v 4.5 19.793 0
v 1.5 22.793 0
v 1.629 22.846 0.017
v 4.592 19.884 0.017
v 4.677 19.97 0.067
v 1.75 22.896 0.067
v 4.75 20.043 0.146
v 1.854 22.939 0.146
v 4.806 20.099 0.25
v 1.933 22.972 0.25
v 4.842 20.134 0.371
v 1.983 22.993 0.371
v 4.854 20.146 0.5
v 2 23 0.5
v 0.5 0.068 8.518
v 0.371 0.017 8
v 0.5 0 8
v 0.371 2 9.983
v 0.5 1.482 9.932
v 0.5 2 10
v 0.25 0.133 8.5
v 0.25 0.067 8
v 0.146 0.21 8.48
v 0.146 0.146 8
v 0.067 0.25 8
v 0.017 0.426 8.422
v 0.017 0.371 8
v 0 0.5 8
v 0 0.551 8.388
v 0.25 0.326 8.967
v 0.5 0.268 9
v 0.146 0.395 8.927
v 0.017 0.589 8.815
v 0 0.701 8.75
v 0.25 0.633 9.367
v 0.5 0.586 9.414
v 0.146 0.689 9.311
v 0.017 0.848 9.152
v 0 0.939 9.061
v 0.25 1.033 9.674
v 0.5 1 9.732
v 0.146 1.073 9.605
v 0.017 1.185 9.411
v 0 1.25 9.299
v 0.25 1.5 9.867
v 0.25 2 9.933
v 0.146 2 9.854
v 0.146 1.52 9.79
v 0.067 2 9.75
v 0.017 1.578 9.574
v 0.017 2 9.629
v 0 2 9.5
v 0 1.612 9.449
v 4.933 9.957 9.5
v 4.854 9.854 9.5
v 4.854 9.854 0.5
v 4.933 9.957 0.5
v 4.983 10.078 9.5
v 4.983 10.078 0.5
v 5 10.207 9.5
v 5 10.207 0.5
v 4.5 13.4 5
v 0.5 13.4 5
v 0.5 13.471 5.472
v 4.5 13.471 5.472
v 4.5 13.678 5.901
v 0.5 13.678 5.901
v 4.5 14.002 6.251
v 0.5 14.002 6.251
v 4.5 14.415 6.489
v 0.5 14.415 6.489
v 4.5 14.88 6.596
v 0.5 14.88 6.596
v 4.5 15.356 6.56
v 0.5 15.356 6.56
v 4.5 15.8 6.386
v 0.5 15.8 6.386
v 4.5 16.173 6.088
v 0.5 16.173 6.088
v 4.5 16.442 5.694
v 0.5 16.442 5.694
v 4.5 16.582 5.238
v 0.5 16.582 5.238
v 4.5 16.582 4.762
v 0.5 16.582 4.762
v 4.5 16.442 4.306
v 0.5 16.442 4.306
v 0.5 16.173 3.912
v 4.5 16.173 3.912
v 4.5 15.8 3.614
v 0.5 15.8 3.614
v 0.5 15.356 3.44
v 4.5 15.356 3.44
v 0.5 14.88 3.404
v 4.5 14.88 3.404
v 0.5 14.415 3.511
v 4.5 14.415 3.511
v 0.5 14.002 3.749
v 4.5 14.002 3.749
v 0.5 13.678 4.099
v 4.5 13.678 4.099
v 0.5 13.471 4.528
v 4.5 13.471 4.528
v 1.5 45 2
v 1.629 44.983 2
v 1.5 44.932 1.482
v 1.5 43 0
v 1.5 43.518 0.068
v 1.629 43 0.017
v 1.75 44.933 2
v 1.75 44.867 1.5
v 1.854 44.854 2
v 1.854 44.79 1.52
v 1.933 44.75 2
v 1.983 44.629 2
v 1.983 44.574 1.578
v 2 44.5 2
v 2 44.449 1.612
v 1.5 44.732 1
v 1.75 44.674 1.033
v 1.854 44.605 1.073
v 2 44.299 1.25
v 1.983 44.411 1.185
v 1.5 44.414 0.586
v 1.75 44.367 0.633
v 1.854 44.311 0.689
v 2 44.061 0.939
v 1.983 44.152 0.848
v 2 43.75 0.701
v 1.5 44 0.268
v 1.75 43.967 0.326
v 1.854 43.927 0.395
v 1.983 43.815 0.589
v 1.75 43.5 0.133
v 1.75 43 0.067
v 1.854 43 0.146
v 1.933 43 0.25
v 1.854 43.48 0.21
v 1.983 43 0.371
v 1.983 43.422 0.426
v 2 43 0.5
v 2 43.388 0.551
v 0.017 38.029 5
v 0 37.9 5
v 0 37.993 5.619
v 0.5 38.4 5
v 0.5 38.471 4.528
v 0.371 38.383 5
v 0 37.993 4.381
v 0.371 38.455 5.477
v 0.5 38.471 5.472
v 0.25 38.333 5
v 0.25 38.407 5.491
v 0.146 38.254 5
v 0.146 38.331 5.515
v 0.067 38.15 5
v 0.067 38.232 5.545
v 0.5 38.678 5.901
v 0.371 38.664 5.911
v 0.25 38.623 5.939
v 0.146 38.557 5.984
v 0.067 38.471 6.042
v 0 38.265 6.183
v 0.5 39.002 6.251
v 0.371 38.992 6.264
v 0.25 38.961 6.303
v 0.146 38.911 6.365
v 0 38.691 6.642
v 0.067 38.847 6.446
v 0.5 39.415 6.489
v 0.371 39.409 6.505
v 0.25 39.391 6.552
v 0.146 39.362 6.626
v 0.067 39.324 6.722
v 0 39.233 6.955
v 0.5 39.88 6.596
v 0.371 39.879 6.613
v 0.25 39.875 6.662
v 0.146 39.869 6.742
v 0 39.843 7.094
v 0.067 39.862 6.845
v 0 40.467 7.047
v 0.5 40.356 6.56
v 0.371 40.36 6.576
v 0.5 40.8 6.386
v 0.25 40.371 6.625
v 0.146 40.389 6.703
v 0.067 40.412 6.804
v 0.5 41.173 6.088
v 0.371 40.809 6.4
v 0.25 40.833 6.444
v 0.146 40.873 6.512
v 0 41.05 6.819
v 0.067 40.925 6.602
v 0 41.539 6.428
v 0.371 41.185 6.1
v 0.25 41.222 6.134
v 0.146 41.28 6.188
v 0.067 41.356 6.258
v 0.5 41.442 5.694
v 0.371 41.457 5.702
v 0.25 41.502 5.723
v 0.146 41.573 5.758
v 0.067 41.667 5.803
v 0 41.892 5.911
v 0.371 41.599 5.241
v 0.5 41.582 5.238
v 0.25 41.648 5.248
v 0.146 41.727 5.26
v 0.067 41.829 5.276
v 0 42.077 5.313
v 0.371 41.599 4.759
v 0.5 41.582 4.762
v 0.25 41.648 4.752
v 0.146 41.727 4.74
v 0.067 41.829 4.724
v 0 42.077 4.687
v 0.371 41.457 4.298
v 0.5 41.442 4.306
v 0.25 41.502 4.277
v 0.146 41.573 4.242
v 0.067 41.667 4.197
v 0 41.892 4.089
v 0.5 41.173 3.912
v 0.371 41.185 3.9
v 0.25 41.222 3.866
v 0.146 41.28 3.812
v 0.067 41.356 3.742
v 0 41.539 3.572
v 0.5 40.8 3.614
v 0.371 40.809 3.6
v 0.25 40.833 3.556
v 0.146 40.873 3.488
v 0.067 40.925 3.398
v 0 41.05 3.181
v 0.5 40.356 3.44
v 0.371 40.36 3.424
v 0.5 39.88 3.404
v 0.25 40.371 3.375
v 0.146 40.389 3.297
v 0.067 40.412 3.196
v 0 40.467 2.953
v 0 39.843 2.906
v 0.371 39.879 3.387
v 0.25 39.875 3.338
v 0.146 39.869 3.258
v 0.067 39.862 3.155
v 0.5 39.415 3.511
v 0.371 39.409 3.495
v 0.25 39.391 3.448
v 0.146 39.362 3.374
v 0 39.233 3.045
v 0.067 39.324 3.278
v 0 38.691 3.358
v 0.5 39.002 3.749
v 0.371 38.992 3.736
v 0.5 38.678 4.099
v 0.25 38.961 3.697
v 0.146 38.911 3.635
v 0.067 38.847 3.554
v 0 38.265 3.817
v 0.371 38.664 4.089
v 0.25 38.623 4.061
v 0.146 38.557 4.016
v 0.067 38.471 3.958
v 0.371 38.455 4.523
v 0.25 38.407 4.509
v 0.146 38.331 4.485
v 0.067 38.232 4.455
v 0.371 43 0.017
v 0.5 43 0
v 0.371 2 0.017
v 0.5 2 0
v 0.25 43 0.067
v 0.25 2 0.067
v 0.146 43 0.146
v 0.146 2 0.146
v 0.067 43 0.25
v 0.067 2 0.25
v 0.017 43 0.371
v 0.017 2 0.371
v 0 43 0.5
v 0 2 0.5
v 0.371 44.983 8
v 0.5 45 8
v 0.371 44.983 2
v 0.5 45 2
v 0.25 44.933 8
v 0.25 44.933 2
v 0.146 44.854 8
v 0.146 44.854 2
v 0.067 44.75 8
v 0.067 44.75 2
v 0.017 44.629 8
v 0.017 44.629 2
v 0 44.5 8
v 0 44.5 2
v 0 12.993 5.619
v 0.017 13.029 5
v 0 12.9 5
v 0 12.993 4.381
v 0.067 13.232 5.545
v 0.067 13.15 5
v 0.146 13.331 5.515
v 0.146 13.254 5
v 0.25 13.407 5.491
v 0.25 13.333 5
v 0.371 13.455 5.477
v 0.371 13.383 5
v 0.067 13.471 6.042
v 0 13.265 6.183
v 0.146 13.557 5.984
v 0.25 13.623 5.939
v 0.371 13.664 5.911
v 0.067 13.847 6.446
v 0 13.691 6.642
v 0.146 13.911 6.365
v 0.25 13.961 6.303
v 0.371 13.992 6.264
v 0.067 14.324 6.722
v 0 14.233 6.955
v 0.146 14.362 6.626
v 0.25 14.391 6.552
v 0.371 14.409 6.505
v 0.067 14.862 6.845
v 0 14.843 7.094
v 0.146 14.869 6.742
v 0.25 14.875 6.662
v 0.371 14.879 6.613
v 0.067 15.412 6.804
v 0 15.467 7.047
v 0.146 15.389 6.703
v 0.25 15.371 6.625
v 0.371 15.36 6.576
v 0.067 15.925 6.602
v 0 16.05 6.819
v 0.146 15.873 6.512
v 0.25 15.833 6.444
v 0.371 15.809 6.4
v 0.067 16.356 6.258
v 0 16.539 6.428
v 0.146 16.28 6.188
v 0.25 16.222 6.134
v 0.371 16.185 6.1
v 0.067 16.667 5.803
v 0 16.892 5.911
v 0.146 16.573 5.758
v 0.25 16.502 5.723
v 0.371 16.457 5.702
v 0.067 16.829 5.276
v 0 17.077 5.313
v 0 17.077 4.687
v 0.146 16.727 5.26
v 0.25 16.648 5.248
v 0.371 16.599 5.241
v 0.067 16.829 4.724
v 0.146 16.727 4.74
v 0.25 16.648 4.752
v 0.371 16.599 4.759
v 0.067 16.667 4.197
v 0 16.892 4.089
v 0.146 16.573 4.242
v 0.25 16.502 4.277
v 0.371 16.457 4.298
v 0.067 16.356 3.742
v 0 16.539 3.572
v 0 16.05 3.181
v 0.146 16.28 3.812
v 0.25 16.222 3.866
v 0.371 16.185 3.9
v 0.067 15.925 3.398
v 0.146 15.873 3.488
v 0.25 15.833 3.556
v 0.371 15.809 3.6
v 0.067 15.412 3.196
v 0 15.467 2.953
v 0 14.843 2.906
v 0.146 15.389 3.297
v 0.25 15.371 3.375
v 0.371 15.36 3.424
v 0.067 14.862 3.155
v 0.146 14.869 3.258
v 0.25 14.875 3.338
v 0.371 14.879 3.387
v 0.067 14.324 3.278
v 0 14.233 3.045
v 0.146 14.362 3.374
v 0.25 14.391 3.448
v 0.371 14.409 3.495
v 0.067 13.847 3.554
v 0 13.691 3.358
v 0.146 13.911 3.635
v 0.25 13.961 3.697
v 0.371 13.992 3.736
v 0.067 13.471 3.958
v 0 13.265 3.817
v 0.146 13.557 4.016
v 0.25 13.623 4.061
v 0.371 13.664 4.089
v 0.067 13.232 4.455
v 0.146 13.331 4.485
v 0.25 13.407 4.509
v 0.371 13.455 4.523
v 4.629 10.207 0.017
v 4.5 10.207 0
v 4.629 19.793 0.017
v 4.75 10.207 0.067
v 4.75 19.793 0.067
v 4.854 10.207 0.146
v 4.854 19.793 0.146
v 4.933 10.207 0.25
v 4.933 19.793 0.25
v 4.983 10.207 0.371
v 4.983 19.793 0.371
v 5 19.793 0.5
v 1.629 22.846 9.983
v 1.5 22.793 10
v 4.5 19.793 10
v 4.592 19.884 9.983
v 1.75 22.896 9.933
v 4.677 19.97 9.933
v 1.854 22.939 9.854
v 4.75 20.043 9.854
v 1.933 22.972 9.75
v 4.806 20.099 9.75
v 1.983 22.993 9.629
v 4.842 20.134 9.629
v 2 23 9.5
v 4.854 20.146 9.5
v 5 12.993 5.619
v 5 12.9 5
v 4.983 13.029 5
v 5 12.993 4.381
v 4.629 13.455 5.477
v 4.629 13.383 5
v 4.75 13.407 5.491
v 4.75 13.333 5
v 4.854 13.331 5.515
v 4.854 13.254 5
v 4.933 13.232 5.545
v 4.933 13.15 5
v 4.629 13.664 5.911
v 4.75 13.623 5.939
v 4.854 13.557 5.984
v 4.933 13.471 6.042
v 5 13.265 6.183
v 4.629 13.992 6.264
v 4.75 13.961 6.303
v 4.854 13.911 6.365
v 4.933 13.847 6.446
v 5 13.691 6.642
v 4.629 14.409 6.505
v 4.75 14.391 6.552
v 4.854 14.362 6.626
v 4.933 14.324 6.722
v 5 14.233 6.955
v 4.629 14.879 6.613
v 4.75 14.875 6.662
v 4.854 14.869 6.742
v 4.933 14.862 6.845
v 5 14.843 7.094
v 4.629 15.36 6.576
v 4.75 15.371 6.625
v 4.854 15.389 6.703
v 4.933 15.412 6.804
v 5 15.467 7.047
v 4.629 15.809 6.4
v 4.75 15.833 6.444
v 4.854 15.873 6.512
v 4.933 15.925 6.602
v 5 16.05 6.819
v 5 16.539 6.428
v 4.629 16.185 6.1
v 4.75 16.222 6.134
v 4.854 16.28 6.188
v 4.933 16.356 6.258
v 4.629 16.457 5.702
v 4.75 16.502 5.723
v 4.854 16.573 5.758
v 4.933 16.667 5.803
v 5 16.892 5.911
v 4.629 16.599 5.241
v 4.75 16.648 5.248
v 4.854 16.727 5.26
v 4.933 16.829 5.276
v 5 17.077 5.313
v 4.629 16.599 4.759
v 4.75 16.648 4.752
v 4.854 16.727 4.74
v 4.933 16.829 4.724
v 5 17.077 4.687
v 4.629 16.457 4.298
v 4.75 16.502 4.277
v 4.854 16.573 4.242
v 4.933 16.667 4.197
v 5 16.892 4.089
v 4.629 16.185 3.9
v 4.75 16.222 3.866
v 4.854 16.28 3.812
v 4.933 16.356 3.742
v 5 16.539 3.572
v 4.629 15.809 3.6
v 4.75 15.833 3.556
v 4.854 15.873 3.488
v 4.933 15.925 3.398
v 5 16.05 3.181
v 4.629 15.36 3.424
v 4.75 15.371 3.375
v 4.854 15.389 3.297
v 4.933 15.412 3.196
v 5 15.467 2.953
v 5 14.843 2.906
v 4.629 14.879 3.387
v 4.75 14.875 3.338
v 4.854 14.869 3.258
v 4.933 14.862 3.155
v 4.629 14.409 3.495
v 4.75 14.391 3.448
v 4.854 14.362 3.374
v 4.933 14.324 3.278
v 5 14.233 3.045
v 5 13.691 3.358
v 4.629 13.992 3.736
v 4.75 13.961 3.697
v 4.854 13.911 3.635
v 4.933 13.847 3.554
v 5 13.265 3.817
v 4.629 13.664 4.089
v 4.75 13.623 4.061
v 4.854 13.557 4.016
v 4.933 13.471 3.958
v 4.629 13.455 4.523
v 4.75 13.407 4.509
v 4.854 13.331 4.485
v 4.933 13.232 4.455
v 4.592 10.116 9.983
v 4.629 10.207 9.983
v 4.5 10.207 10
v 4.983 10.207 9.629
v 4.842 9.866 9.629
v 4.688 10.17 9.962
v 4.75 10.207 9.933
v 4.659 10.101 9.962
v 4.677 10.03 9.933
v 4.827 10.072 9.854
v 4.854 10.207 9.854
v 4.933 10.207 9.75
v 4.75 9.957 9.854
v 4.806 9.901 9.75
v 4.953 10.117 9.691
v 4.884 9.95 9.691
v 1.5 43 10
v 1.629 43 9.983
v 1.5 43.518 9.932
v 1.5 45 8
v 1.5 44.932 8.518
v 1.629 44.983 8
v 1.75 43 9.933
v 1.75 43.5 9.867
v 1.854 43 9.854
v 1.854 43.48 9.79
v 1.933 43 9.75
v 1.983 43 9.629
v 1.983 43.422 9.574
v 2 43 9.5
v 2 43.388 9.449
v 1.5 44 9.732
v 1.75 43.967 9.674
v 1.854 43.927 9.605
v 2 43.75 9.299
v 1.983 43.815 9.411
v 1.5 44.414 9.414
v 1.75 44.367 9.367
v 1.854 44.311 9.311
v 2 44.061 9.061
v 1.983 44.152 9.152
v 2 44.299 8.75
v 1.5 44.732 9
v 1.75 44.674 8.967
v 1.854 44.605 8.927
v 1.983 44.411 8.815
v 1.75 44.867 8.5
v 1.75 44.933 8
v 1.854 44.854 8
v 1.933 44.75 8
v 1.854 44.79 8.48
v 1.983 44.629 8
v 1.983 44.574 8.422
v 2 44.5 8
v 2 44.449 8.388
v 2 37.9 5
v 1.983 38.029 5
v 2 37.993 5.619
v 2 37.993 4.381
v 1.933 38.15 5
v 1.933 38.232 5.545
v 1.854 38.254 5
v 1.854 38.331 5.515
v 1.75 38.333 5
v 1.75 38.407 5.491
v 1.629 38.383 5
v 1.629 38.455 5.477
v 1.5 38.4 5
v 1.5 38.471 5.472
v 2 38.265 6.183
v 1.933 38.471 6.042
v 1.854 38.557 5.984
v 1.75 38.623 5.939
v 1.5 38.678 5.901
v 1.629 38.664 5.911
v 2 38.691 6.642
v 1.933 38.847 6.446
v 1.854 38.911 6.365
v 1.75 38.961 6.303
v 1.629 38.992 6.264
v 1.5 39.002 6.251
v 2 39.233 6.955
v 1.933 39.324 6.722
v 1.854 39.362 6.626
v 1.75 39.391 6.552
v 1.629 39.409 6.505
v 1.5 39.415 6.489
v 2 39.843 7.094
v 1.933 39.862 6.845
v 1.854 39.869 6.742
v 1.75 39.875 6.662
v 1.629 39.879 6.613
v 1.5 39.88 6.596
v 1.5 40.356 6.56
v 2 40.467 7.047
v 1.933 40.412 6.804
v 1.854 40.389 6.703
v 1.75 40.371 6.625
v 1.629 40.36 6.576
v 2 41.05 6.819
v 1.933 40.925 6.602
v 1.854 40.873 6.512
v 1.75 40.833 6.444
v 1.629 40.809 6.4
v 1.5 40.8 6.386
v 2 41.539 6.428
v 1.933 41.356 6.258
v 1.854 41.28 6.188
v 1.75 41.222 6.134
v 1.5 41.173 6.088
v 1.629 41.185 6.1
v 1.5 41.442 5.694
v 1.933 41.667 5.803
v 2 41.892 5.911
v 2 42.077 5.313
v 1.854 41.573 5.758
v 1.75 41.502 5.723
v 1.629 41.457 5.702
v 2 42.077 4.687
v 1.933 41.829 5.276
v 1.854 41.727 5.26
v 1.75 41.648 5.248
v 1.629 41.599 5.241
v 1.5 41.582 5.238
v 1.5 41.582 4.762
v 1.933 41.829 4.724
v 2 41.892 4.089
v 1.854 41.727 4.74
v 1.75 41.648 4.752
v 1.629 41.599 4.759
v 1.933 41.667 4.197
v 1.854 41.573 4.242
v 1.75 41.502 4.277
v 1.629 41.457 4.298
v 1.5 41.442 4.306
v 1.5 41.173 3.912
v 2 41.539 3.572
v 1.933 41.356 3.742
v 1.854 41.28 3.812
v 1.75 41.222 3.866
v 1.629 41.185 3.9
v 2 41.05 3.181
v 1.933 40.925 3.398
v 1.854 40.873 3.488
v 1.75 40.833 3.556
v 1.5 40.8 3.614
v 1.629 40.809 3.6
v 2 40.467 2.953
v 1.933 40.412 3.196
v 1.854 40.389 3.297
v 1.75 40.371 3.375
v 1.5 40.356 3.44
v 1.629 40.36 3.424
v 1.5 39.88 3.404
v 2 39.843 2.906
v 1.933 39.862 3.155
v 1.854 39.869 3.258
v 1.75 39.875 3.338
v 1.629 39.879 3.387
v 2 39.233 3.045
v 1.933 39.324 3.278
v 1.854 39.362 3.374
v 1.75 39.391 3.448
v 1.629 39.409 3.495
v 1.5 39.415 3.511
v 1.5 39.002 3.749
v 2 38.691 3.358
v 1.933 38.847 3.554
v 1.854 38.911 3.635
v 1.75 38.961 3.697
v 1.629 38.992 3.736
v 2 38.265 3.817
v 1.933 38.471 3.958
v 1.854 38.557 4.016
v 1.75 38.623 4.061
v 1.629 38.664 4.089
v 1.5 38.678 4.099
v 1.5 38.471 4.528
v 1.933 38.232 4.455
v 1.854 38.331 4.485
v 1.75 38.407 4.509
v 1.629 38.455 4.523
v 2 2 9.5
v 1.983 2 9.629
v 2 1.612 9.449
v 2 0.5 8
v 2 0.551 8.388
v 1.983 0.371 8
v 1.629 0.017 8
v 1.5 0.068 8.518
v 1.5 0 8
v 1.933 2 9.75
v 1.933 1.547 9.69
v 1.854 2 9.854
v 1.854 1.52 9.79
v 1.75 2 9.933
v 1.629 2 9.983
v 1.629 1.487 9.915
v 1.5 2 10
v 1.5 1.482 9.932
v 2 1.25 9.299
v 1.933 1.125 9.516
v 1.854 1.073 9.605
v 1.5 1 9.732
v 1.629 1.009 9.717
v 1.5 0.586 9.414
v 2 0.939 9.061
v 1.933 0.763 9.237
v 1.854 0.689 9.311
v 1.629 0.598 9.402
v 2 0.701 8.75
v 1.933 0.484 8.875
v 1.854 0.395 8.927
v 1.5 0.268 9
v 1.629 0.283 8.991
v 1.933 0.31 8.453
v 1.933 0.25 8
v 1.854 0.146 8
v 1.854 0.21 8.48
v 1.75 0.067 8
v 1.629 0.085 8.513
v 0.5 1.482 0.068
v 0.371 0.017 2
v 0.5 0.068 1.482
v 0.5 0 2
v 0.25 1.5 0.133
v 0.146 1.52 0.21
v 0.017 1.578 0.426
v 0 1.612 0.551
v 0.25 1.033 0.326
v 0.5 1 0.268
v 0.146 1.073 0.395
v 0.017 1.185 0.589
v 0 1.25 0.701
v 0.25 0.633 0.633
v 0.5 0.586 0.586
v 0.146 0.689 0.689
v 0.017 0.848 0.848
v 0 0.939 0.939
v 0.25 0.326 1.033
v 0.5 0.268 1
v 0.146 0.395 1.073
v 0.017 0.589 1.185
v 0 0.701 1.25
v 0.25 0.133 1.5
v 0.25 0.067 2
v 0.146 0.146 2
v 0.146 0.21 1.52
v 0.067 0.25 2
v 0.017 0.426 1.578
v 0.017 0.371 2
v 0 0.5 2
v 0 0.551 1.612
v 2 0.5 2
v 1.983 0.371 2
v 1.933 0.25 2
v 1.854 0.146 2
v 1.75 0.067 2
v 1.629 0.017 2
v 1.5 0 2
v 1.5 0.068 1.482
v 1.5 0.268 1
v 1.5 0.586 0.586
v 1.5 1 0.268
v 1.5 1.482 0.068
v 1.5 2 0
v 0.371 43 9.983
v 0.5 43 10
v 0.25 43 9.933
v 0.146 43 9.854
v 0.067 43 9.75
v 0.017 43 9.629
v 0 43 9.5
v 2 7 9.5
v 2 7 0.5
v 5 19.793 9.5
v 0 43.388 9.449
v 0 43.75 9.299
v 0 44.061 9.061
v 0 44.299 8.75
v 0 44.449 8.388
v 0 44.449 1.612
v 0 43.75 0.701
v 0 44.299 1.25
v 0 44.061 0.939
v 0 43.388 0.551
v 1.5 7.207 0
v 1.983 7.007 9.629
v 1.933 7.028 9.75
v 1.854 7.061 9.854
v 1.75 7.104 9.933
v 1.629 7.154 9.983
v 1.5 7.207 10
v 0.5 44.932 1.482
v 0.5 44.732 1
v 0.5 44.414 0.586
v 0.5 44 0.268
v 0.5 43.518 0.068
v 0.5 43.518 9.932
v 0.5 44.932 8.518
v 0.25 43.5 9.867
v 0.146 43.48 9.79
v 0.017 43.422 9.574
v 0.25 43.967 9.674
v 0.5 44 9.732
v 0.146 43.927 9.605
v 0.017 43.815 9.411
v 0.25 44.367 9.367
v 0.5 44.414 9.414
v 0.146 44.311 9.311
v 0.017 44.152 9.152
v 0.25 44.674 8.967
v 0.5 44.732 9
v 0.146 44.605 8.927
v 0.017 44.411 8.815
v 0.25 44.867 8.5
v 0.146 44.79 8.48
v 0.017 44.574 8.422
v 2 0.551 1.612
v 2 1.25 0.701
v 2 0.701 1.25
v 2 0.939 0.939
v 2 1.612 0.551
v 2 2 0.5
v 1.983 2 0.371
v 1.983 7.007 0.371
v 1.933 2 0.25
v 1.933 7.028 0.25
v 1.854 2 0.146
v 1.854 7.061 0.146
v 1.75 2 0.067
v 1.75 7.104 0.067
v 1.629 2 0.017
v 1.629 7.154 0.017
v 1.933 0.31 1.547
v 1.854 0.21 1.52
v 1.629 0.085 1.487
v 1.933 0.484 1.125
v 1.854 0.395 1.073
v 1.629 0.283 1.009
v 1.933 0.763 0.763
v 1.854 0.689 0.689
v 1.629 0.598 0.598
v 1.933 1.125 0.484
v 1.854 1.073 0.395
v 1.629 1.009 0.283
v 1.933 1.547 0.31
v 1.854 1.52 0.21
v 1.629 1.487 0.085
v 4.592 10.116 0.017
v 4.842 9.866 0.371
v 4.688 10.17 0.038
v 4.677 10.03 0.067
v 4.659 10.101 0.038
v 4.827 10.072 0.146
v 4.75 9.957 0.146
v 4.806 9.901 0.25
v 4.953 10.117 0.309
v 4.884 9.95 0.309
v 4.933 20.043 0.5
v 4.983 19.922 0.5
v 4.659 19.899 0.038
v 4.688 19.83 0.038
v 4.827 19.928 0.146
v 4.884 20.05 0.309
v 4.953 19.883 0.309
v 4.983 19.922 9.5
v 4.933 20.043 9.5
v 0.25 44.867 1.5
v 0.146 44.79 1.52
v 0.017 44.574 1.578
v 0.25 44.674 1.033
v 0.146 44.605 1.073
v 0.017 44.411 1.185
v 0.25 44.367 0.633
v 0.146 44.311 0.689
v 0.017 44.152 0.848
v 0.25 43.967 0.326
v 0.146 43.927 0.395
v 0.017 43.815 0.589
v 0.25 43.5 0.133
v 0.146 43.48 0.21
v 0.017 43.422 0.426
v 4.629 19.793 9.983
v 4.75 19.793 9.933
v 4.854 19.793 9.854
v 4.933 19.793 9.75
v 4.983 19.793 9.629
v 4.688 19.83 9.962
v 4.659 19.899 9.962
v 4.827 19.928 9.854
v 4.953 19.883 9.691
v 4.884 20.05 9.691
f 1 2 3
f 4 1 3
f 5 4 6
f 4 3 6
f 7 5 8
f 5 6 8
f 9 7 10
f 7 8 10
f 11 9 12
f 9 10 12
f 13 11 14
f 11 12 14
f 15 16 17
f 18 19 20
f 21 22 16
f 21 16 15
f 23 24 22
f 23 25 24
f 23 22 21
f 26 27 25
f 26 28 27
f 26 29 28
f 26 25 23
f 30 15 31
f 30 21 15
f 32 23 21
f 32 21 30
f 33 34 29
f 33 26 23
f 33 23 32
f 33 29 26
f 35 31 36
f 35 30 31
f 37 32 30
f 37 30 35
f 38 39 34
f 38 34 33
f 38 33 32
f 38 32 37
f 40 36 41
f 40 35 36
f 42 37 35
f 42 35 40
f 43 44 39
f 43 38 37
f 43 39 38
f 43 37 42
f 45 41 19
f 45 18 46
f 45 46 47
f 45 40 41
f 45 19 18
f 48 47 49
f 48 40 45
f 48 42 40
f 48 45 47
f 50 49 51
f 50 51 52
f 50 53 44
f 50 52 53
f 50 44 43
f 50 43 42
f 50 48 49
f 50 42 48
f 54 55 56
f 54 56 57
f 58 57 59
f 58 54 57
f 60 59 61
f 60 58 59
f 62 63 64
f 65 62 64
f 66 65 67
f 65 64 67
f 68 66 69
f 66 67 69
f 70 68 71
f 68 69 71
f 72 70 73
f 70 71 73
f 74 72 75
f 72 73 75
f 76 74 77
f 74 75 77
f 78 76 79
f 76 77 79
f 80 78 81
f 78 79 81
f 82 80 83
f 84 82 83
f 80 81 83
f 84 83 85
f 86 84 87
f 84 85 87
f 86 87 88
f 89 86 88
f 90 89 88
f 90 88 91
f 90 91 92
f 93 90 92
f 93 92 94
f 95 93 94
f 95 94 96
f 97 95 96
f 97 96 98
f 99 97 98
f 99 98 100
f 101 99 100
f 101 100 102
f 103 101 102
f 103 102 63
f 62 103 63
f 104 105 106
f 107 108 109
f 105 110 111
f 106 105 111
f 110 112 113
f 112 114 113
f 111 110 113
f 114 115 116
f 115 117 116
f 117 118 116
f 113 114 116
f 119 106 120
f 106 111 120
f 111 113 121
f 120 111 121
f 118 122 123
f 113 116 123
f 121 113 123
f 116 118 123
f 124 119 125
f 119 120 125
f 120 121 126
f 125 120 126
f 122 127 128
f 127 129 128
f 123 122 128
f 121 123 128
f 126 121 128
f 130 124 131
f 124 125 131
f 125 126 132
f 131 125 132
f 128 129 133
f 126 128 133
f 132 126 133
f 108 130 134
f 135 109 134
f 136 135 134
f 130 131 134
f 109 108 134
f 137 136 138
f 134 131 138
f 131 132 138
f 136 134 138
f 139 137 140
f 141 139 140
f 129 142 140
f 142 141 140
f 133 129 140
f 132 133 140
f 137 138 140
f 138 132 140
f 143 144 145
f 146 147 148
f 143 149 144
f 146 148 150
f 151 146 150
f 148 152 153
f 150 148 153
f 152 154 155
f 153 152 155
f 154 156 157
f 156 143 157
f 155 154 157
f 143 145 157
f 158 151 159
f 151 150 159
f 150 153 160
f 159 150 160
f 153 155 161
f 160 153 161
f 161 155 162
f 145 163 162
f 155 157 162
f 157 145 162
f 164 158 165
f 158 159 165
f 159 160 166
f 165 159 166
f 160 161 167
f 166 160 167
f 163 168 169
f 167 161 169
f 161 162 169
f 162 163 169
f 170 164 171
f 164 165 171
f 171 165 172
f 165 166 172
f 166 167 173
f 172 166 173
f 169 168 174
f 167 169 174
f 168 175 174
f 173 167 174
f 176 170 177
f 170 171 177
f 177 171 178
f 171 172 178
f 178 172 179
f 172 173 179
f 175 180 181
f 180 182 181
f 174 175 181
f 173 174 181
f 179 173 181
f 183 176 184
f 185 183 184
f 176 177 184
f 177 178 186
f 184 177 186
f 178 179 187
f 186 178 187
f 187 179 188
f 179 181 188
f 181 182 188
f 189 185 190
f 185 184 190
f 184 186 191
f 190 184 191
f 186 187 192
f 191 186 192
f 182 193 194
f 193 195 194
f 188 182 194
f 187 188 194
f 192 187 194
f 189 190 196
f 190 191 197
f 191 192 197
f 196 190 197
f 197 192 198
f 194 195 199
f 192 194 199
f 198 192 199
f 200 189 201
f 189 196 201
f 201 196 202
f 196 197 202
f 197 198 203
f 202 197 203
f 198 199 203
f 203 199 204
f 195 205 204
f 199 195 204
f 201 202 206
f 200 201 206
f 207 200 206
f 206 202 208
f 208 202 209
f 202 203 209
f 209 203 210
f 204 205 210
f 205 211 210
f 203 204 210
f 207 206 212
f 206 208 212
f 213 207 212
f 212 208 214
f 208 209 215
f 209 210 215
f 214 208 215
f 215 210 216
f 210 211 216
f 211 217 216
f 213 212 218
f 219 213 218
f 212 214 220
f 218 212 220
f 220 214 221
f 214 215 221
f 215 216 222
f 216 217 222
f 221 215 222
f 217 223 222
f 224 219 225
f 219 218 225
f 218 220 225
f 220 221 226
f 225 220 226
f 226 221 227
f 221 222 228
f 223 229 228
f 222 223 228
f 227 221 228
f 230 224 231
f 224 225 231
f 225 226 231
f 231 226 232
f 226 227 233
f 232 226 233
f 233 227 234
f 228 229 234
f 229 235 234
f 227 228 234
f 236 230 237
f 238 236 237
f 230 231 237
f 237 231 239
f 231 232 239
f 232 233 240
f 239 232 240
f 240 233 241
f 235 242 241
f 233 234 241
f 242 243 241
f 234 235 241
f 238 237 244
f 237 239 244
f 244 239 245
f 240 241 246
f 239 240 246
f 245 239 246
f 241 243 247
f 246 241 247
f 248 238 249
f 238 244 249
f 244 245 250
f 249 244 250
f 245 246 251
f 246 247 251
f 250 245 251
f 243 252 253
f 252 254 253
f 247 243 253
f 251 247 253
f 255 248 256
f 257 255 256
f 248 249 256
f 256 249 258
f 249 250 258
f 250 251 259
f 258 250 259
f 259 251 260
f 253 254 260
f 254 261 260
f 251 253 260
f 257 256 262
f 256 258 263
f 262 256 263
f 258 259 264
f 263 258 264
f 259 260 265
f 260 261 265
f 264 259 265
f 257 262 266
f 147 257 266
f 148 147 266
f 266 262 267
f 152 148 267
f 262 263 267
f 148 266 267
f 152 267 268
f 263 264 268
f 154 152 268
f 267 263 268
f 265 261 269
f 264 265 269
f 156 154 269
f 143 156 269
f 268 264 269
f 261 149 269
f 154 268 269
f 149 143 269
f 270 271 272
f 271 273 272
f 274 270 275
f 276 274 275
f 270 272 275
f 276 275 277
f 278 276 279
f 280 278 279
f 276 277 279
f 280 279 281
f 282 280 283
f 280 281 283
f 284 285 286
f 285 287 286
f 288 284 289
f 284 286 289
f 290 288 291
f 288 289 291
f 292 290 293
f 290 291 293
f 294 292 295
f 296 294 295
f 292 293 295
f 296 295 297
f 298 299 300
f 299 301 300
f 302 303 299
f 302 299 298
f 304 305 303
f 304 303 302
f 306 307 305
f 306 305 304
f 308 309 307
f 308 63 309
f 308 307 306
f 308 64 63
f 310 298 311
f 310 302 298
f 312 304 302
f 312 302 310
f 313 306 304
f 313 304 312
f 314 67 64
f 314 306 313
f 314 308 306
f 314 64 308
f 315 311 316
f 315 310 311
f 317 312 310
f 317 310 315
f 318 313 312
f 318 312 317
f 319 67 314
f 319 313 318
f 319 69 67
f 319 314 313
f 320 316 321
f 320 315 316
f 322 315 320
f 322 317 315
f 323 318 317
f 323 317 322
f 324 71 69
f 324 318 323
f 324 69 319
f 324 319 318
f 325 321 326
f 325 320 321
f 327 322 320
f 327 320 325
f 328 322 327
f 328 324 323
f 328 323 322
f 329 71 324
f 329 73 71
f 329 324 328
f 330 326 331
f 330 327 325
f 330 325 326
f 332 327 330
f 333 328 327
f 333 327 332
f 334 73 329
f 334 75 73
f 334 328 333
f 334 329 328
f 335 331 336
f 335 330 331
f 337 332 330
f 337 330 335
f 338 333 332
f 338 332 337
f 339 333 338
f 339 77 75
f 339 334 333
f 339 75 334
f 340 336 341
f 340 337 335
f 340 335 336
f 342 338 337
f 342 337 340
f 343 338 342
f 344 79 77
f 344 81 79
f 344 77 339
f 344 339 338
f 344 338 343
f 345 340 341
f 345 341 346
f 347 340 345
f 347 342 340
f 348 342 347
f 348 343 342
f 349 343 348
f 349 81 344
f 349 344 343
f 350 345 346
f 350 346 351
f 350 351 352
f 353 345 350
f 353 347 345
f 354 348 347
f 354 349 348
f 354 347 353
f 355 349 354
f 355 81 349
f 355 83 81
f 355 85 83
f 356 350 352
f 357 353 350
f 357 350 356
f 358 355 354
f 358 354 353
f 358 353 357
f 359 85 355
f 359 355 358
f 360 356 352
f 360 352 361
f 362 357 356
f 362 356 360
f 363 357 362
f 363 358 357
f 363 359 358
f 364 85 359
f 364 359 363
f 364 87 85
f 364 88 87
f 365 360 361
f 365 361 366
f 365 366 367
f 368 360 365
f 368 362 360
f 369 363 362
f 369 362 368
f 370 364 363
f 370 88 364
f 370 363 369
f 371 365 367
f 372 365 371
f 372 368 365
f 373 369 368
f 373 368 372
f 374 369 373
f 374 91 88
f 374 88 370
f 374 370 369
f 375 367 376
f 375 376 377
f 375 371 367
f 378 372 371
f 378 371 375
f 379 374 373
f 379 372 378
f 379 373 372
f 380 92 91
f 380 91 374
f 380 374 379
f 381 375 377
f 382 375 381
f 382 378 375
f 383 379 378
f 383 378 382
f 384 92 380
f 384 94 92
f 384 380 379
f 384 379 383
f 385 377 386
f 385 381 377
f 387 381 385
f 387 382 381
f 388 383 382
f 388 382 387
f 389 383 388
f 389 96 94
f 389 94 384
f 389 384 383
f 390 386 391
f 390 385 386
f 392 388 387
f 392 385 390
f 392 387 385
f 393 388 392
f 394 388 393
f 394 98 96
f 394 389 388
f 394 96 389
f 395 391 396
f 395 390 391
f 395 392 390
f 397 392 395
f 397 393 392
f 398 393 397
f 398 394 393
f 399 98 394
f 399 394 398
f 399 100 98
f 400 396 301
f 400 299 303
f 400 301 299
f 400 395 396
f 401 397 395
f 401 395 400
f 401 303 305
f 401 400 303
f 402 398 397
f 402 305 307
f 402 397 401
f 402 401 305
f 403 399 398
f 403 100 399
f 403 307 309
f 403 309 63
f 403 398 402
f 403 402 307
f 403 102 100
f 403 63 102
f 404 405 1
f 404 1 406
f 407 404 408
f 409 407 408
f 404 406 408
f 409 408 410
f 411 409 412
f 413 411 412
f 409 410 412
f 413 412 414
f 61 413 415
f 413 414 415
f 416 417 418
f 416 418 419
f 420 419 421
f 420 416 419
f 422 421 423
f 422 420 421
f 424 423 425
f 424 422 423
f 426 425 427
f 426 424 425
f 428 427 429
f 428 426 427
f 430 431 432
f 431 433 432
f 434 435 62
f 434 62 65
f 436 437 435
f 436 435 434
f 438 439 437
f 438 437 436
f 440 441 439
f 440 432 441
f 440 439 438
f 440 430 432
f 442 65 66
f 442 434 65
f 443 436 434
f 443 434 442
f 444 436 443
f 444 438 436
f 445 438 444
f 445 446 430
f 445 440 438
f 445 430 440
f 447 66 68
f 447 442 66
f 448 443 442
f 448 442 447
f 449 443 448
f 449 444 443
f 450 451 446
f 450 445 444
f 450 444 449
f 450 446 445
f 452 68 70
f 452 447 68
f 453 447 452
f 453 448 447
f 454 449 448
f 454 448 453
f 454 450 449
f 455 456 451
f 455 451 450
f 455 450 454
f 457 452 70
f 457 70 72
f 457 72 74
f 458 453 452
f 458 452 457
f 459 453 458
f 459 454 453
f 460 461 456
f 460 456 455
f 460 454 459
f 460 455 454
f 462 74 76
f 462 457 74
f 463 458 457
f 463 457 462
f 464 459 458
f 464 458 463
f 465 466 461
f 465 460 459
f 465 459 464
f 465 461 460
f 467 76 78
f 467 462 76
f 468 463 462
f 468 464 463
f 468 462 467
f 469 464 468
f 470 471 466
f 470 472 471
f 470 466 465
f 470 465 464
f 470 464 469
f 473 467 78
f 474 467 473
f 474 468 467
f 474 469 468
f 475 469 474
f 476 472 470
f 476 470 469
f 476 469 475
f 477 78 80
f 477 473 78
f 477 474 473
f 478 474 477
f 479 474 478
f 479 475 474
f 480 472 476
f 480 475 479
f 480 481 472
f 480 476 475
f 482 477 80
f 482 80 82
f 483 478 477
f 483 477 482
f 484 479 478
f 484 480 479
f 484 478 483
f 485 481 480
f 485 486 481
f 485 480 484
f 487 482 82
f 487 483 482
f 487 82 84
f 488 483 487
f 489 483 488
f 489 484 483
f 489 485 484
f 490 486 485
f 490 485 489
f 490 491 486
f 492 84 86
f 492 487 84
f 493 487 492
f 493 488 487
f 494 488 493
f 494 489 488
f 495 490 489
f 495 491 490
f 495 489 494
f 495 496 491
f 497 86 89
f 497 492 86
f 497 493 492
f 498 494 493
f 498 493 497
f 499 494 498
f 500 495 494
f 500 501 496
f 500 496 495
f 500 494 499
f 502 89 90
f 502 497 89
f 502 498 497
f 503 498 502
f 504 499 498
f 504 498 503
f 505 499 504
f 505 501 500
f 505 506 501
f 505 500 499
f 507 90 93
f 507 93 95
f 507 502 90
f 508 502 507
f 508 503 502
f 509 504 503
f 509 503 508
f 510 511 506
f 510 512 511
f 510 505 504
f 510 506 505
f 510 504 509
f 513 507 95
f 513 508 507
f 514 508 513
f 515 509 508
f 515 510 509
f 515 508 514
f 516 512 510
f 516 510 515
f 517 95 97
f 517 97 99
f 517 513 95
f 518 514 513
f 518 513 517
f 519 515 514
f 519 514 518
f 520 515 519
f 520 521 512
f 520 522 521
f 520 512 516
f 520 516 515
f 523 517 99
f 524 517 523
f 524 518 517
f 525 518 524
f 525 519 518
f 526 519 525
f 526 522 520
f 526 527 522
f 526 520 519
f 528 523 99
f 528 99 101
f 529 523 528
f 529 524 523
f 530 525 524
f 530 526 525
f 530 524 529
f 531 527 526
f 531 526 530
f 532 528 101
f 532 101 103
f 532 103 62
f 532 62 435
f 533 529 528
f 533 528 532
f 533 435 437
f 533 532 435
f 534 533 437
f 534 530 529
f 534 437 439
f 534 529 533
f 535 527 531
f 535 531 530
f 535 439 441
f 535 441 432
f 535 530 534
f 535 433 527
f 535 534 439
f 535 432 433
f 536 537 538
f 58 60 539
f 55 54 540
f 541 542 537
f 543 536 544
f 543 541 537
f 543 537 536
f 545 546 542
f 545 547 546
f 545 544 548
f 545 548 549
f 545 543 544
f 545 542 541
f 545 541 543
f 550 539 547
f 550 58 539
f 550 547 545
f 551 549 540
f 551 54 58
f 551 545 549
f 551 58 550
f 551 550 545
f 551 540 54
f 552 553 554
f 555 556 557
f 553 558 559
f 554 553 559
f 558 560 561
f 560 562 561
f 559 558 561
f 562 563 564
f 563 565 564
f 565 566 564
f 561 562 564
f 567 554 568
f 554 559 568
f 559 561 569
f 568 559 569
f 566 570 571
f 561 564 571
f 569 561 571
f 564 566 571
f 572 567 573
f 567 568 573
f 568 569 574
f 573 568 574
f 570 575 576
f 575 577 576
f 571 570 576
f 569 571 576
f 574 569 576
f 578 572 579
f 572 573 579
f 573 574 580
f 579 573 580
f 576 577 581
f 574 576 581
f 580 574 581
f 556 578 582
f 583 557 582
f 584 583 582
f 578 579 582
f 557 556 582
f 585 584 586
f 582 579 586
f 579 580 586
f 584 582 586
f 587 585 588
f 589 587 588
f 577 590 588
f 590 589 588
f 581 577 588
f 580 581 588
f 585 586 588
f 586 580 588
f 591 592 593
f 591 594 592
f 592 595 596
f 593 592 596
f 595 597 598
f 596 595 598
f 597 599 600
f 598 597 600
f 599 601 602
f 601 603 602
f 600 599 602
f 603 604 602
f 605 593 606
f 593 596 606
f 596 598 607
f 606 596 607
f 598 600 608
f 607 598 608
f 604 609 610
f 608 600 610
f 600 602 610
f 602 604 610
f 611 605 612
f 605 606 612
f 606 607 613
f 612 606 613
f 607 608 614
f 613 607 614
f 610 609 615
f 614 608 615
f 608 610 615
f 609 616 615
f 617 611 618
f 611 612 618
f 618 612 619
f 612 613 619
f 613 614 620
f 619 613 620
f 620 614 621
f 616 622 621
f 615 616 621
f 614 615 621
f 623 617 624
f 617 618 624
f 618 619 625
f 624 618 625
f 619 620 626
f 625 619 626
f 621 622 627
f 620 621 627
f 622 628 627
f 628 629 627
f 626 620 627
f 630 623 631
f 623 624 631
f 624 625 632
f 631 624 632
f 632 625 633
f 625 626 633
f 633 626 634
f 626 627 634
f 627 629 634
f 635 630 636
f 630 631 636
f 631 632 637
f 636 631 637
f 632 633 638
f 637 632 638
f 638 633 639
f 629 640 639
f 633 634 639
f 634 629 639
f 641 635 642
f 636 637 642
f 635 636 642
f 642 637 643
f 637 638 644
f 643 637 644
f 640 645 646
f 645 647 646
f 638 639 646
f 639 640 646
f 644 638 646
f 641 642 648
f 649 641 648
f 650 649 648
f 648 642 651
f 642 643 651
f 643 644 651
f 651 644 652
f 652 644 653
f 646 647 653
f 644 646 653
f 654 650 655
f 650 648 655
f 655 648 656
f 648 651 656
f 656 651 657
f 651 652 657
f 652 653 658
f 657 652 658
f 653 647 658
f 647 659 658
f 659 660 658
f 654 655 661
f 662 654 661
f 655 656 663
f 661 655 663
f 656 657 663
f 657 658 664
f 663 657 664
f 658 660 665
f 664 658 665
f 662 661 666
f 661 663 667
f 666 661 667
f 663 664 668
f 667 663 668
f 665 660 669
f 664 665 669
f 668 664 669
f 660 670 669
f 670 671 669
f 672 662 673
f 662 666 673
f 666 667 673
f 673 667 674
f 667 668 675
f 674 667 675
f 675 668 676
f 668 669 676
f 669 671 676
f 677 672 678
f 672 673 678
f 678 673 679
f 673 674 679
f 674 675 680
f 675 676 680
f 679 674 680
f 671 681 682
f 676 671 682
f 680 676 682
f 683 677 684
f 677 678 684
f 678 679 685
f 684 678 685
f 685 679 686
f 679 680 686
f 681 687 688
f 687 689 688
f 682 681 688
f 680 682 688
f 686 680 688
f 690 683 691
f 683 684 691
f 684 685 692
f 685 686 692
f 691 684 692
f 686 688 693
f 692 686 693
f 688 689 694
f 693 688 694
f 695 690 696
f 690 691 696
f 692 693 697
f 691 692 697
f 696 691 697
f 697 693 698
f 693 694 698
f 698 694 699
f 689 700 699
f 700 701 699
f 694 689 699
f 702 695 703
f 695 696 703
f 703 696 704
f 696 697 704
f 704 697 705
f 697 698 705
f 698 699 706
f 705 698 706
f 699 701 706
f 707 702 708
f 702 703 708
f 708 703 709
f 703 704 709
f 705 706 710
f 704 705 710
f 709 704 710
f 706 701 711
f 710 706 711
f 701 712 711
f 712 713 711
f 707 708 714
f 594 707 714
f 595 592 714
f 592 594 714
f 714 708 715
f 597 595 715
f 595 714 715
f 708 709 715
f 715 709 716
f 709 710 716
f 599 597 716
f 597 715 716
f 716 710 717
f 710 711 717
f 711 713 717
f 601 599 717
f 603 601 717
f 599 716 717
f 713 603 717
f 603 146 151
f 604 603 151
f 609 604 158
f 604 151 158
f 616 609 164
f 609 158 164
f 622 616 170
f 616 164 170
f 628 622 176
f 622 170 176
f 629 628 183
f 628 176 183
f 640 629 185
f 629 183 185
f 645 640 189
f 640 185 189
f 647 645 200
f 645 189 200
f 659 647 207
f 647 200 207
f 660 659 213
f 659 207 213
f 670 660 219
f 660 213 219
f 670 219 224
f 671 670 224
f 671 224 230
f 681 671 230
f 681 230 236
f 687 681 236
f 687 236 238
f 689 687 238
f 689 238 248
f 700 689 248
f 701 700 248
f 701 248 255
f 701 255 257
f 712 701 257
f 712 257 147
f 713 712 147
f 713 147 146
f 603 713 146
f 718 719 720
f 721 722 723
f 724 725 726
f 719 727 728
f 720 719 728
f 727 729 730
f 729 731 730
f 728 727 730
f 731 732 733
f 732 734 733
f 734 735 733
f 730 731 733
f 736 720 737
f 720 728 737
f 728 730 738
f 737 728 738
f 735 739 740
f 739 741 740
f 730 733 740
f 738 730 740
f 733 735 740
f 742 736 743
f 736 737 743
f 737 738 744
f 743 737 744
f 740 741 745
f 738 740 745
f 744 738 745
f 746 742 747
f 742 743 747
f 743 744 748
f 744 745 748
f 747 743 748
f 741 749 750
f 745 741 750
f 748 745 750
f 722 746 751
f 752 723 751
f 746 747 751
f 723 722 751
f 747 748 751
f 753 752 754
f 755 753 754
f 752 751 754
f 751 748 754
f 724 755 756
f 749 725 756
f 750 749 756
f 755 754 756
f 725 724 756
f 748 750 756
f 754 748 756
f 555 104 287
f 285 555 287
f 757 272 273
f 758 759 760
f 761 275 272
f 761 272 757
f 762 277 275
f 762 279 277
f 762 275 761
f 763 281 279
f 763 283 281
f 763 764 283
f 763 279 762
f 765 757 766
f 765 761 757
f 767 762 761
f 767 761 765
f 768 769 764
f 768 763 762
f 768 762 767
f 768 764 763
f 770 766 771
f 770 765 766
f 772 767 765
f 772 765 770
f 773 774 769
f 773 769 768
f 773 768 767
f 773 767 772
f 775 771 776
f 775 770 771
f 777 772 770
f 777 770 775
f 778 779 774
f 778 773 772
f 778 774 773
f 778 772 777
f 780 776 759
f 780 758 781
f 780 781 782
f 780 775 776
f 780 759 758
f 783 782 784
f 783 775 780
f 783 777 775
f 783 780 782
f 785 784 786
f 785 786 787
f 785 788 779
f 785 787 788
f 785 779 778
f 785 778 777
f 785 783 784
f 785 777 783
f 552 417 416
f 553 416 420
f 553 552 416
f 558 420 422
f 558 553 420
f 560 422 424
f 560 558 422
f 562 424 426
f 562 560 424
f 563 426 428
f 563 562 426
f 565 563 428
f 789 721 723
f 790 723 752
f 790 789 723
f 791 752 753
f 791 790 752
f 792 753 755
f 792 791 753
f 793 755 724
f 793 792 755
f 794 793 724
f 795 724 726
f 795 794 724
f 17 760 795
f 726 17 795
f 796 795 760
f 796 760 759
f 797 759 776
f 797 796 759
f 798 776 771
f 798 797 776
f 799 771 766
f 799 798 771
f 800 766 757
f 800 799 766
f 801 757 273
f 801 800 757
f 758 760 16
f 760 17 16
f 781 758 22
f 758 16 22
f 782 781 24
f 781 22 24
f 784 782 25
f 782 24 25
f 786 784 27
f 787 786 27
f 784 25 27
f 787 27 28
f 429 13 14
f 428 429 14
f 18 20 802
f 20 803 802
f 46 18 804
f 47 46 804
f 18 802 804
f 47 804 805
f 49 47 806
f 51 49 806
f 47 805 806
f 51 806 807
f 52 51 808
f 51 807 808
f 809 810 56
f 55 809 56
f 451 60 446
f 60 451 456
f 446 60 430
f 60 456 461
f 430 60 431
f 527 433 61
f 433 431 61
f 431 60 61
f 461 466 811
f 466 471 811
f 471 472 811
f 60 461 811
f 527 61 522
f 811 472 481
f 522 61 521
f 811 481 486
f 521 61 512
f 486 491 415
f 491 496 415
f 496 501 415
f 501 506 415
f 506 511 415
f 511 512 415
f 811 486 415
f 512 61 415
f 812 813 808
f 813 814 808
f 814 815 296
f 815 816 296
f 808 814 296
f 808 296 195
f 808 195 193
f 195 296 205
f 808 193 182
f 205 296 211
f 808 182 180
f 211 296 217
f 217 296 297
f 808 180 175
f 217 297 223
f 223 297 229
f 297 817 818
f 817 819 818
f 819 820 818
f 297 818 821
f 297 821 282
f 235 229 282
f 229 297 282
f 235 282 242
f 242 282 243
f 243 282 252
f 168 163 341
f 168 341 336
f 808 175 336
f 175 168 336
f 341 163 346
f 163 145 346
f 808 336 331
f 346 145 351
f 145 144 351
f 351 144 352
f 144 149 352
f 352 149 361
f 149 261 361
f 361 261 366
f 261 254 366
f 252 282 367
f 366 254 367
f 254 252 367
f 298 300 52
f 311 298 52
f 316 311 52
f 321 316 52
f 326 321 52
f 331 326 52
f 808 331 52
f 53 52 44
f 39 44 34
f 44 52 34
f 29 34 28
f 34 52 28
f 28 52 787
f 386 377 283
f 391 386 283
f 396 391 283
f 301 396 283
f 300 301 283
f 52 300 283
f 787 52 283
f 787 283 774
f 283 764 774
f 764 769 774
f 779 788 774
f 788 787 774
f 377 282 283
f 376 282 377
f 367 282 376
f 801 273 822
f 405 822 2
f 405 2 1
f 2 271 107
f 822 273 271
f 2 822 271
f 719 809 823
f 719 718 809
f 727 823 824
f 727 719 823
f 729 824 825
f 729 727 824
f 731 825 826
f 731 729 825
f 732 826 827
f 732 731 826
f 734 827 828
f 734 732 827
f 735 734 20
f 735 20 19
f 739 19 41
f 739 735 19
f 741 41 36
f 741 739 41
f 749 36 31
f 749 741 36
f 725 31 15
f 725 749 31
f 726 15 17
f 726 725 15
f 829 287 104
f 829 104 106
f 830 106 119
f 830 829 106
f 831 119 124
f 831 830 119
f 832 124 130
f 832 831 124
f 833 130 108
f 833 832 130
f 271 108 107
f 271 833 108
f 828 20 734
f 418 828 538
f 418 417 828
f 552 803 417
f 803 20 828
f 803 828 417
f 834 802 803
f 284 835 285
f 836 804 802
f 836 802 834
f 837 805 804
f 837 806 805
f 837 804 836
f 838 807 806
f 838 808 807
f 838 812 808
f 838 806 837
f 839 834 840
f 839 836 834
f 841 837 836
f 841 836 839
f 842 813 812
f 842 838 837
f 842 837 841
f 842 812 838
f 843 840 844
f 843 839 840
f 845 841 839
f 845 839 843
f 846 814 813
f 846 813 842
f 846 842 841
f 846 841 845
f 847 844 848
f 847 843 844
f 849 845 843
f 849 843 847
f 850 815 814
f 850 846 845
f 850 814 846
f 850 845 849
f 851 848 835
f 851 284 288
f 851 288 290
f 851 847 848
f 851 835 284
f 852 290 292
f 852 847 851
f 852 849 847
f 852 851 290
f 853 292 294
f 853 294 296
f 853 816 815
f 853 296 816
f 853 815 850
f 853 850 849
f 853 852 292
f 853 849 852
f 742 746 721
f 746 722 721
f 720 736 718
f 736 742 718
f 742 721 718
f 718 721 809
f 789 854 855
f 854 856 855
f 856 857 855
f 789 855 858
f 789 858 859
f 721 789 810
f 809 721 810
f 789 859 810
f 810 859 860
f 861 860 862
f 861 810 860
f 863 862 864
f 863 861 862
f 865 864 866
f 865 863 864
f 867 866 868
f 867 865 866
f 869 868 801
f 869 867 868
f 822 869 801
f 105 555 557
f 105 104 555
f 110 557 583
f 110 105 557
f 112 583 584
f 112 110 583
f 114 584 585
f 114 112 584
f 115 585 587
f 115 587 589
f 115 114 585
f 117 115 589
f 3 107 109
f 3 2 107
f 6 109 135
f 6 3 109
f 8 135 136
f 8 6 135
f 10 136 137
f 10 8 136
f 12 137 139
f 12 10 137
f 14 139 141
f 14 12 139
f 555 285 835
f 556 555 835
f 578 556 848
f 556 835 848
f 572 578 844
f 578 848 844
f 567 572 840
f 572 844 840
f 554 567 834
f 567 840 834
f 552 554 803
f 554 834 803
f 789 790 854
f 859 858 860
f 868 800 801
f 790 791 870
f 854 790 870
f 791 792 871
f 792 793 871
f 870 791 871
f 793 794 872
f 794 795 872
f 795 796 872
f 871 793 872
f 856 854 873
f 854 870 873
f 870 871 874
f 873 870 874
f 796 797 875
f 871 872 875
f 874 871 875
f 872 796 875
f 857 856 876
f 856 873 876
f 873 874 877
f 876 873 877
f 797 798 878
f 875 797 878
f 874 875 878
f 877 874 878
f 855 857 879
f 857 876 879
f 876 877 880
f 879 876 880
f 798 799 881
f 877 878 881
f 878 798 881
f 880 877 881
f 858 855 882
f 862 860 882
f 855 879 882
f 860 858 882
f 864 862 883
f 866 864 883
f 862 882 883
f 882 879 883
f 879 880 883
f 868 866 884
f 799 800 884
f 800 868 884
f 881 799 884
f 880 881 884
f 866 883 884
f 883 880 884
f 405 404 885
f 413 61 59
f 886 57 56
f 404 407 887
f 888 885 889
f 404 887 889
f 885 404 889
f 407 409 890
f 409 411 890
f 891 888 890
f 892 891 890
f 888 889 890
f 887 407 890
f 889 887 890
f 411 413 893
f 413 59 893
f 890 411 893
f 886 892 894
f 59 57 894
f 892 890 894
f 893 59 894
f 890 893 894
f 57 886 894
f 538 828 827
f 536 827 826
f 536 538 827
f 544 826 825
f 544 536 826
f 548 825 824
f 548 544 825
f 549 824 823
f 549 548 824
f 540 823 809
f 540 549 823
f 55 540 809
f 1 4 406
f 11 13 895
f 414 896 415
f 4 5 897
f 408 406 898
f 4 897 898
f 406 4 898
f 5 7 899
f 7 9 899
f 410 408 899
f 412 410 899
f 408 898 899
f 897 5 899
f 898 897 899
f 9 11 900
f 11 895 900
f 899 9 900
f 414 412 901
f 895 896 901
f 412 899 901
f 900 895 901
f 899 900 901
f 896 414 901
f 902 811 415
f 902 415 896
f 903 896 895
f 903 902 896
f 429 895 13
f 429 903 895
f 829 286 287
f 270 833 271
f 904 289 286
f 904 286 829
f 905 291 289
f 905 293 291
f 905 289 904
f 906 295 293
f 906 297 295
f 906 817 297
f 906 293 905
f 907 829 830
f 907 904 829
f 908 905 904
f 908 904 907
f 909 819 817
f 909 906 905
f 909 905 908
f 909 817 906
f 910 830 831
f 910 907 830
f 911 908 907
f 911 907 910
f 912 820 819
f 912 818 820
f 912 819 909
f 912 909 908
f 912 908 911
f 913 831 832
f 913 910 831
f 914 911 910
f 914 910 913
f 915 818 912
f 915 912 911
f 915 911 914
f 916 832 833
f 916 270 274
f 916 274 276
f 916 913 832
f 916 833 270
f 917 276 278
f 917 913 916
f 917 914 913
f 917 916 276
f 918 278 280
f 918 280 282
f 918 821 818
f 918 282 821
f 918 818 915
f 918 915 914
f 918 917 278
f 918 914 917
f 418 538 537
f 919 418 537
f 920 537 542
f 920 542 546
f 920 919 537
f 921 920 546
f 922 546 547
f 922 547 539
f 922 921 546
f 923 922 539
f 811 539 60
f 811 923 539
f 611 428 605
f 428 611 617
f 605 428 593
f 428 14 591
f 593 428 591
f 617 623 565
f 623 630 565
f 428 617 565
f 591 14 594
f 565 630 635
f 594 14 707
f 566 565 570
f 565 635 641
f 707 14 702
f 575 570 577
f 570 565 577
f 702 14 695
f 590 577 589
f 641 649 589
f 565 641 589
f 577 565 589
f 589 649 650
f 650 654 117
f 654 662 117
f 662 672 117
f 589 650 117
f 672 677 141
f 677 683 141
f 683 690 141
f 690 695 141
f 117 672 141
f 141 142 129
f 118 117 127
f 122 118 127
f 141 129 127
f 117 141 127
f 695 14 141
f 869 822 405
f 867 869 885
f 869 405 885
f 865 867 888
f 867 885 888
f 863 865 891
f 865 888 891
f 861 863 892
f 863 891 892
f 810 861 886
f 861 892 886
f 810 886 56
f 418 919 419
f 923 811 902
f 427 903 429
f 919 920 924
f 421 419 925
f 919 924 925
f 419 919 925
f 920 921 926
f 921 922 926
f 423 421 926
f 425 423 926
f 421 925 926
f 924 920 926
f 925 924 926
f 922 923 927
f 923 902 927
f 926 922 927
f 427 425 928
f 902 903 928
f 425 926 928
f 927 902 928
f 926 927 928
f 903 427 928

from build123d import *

# Parameters (mm, degrees)
EXTRUDE_1_DEPTH     = 10
SKETCH_2_R          = 1.6
CUT_EXTRUDE_1_DEPTH = 47.368092477
FILLET_8_R          = 0.5
FILLET_6_R          = 2
FILLET_9_R          = 0.5
FILLET_10_R         = 0.5


with BuildPart() as part:
    # Эскиз1 → Бобышка-Вытянуть1 (new body)
    with BuildSketch(Plane.XY):
        Polygon((0, 0), (2, 0), (2, 7), (5, 10), (5, 20), (2, 23), (2, 45), (0, 45), align=None)
    extrude(amount=EXTRUDE_1_DEPTH)

    # Эскиз2 → Вырез-Вытянуть1 (cut, through all)
    with BuildSketch(Plane.ZY):
        with Locations(Location((5, 15, 0), (0, 0, 270))):
            Circle(SKETCH_2_R)
        with Locations(Location((5, 40, 0), (0, 0, 270))):
            Circle(SKETCH_2_R)
    extrude(amount=-CUT_EXTRUDE_1_DEPTH, mode=Mode.SUBTRACT)

    # Скругление8
    fillet_8_edges = [part.edges().sort_by_distance(p)[0] for p in [
        (3.5, 8.5, 10),
        (5, 20, 5),
        (5, 10, 5),
        (5, 15, 10),
        (3.5, 21.5, 10),
        (3.5, 21.5, 0),
        (5, 15, 0),
        (3.5, 8.5, 0),
    ]]
    fillet(fillet_8_edges, radius=FILLET_8_R)

    # Скругление6
    fillet_6_edges = [part.edges().sort_by_distance(p)[0] for p in [
        (1, 0, 0),
        (1, 45, 10),
        (1, 0, 10),
        (1, 45, 0),
    ]]
    fillet(fillet_6_edges, radius=FILLET_6_R)

    # Скругление9
    fillet_9_edges = [part.edges().sort_by_distance(p)[0] for p in [
        (0, 44.414213562, 0.585786438),
        (0, 45, 5),
        (0, 44.414213562, 9.414213562),
        (0, 22.5, 10),
        (0, 0.585786438, 9.414213562),
        (0, 0, 5),
        (0, 0.585786438, 0.585786438),
        (2, 32.646446609, 10),
        (2, 44.414213562, 9.414213562),
        (2, 32.646446609, 0),
        (2, 44.414213562, 0.585786438),
        (2, 4.853553391, 10),
        (2, 0.585786438, 9.414213562),
        (2, 4.853553391, 0),
        (2, 0.585786438, 0.585786438),
        (0, 22.5, 0),
        (2, 45, 5),
        (2, 0, 5),
    ]]
    fillet(fillet_9_edges, radius=FILLET_9_R)

    # Скругление10
    fillet_10_edges = [part.edges().sort_by_distance(p)[0] for p in [
        (5, 16.6, 5),
        (0, 16.6, 5),
        (2, 41.6, 5),
        (0, 41.6, 5),
    ]]
    fillet(fillet_10_edges, radius=FILLET_10_R)


solid = part.part
